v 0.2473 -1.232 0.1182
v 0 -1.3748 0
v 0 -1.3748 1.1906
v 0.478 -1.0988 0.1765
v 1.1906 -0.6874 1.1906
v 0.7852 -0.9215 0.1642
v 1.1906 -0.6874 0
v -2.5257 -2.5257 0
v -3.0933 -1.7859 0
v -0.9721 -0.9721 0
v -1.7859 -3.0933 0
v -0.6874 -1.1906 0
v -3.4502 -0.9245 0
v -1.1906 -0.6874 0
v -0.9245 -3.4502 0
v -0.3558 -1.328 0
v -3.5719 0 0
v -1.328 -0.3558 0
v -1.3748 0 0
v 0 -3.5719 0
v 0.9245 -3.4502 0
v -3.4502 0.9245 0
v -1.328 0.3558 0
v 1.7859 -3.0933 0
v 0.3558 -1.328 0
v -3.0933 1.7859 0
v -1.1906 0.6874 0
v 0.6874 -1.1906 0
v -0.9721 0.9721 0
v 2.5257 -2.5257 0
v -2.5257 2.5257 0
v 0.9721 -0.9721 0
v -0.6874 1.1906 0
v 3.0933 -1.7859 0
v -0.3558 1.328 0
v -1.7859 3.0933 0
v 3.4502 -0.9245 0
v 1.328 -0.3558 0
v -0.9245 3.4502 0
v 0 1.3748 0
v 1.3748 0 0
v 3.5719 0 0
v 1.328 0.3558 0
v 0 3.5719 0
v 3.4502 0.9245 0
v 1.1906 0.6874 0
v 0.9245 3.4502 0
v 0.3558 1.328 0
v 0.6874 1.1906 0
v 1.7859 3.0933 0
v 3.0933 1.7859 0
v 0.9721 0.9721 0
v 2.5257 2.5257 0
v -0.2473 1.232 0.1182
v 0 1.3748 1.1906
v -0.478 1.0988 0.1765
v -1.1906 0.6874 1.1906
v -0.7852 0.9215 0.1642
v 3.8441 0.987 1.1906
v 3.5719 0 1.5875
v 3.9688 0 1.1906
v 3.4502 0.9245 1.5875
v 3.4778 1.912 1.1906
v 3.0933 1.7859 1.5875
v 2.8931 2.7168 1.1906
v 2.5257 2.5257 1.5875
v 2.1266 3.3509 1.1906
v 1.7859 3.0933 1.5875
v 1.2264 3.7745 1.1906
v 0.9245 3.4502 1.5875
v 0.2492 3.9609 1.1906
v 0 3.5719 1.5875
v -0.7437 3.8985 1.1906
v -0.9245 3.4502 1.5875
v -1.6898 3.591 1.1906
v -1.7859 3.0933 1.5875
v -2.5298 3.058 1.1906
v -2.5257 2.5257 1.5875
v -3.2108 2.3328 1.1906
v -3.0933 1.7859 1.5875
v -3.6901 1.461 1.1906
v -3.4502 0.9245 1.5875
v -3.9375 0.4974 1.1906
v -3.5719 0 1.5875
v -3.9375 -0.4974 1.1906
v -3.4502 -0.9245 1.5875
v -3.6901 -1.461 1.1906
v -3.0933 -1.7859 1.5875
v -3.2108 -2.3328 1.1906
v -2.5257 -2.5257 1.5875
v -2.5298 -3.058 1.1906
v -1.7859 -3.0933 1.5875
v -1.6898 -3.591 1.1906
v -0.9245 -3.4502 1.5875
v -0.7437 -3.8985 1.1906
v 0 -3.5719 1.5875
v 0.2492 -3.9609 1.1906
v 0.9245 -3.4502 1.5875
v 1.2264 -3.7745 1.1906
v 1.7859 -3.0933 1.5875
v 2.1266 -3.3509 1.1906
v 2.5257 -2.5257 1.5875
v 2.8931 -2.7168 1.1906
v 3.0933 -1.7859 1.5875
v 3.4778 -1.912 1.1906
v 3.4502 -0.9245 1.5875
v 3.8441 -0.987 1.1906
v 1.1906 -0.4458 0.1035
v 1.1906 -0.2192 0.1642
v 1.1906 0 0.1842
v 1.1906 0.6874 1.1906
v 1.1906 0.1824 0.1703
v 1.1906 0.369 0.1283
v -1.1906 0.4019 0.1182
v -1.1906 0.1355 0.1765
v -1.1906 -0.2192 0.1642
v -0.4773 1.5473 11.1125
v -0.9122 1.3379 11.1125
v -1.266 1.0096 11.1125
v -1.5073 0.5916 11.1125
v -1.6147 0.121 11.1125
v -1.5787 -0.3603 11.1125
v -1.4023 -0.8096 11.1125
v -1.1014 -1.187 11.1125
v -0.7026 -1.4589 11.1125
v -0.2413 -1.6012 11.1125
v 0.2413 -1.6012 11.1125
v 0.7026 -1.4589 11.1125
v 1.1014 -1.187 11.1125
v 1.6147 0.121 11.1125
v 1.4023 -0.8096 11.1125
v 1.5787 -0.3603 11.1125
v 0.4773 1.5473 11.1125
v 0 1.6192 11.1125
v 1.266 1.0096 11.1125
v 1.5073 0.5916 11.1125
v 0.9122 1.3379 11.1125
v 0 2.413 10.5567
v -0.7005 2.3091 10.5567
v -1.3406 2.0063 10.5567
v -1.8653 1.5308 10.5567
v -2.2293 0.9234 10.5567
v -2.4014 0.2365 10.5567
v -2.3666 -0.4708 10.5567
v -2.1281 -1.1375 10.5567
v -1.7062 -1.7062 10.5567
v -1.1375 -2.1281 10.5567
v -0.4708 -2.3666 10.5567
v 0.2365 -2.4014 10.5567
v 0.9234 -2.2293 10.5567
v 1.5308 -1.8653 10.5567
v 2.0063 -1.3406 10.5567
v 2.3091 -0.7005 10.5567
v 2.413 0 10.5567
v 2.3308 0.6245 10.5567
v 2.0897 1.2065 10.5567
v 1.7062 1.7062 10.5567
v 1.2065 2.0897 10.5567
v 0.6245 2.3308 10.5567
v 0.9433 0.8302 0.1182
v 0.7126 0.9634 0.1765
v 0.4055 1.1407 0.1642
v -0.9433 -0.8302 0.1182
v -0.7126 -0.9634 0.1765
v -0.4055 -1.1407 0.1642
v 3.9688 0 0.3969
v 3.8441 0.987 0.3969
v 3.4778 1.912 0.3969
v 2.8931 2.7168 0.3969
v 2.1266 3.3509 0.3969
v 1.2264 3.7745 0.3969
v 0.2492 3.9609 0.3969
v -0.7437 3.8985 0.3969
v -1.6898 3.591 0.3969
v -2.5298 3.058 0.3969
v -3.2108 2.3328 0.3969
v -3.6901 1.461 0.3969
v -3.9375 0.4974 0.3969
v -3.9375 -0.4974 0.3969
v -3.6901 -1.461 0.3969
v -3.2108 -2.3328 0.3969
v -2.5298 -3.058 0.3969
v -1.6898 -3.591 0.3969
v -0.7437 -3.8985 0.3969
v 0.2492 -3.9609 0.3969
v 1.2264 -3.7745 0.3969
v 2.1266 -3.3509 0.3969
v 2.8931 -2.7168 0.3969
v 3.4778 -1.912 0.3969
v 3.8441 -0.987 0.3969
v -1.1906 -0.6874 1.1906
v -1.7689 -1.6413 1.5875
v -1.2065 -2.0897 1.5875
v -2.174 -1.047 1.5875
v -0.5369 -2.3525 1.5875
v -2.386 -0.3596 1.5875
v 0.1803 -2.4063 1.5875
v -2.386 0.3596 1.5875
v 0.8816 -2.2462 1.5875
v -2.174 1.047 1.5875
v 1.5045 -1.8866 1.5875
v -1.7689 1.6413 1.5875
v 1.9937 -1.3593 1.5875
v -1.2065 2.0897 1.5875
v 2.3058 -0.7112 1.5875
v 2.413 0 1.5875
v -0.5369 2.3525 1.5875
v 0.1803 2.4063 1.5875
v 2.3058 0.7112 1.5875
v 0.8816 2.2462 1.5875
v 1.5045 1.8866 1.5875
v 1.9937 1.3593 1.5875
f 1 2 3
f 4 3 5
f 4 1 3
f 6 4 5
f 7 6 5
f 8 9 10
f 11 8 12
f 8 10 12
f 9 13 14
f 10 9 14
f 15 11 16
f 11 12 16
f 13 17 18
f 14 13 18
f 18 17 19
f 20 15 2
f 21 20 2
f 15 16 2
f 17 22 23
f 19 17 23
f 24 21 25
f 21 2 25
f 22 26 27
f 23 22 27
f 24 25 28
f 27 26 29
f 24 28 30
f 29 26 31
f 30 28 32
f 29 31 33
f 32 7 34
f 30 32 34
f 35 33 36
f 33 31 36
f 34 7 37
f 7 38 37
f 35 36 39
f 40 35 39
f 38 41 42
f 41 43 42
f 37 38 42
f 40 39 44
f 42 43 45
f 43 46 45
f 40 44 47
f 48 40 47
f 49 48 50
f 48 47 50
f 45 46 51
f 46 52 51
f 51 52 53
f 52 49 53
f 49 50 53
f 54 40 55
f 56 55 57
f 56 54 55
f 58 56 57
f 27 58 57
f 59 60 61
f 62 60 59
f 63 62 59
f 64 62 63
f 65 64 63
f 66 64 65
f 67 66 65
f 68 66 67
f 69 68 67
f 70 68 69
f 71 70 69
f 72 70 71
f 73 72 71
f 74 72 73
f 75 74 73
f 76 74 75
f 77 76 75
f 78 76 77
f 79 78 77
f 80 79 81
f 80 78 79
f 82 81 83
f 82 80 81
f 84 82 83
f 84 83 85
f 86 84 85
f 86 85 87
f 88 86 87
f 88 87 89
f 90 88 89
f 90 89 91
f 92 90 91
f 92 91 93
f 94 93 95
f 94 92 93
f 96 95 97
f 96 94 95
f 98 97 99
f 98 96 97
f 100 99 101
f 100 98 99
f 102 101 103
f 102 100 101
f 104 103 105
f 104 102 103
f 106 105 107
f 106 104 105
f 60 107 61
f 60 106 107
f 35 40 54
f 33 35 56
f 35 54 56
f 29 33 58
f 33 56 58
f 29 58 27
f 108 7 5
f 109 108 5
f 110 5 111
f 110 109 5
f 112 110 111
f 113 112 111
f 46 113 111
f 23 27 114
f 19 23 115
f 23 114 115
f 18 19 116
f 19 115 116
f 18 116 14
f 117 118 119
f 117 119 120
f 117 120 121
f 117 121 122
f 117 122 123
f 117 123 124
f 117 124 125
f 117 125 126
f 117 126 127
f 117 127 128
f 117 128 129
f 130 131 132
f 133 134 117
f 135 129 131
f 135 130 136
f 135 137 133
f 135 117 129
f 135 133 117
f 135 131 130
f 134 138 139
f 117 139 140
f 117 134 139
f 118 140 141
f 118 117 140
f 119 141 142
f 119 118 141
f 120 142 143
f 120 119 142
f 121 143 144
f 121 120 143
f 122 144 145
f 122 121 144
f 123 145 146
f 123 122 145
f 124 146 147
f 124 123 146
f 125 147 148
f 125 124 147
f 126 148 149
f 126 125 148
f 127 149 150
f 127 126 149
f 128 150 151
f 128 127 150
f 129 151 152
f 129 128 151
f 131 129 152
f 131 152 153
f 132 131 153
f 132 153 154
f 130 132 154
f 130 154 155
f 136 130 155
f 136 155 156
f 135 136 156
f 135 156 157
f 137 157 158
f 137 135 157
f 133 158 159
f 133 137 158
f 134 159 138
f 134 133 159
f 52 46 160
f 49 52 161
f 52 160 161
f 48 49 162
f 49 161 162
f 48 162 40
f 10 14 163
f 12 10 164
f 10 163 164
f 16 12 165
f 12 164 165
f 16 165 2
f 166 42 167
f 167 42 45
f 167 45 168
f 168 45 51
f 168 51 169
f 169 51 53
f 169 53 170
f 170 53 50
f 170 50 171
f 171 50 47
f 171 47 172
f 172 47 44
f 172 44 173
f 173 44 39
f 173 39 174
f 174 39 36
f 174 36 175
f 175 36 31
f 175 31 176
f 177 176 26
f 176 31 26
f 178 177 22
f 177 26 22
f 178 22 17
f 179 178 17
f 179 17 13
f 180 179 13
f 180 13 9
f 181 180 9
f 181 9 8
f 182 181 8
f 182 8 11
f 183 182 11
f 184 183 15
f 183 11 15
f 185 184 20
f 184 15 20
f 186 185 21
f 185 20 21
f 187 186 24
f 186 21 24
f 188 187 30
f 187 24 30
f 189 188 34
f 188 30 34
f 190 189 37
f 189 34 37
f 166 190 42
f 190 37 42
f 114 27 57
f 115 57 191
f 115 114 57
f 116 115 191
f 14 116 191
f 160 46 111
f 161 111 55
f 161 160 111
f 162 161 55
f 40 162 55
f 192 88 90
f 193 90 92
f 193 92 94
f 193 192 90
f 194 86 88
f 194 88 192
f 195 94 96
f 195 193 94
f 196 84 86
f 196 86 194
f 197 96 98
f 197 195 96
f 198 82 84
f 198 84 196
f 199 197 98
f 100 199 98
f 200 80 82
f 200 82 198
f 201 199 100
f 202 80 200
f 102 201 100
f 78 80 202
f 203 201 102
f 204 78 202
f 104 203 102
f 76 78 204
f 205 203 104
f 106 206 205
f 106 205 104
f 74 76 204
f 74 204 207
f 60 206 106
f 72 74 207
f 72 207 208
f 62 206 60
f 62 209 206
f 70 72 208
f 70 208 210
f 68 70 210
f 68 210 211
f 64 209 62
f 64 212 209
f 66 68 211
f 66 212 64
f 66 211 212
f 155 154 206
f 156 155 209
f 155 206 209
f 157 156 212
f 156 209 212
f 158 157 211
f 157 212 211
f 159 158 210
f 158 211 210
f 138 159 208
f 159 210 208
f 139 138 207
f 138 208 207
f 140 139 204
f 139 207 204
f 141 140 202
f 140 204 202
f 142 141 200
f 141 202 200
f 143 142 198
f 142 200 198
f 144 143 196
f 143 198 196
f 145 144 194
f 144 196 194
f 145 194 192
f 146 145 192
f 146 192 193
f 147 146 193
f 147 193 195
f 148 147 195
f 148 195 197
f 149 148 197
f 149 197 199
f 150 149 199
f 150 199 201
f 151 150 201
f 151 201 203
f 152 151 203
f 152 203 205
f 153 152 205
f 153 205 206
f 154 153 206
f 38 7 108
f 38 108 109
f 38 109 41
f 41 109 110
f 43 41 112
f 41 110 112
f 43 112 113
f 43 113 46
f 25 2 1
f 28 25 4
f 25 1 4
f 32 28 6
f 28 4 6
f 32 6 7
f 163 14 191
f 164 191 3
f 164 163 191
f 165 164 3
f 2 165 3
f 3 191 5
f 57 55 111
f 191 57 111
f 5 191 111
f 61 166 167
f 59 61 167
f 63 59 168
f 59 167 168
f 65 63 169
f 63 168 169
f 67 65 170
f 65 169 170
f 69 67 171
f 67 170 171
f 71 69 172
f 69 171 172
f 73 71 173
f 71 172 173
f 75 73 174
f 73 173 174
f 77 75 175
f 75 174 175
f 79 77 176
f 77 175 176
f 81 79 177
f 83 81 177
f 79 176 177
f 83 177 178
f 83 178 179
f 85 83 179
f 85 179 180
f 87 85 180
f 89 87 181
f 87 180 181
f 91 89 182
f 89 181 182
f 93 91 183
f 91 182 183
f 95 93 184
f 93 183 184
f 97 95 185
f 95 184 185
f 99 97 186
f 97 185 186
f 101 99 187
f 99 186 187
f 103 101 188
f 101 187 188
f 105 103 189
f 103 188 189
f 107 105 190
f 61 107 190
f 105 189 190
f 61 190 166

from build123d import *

# Parameters (mm, degrees)
SKETCH1_R          = 2.413
EXTRUDE1_DEPTH     = 11.1125
SKETCH6_R          = 3.96875
EXTRUDE2_DEPTH     = 1.5875
CUT_EXTRUDE1_DEPTH = 1.190625
SKETCH8_R          = 1.374815329
CUT_EXTRUDE2_DEPTH = 1.190625
CUT_EXTRUDE2_TAPER = 45
CHAMFER1_SIZE      = 0.396875


with BuildPart() as part:
    # Sketch1 → Extrude1 (new body)
    with BuildSketch(Plane.XY):
        Circle(SKETCH1_R)
    extrude(amount=EXTRUDE1_DEPTH)

    # Sketch4 → Cut-Revolve1 (revolve, cut)
    with BuildSketch(Plane(origin=(0, 0, 0), x_dir=(0, 0, -1), z_dir=(1, 0, 0))):
        Polygon((-10.556710267, 2.413), (-11.1125, 1.61925), (-11.1125, 2.413), align=None)
    revolve(axis=Axis((0, 0, 0), (0, 0, 1)), mode=Mode.SUBTRACT)

    # Sketch6 → Extrude2 (add)
    with BuildSketch(Plane.XY):
        Circle(SKETCH6_R)
    extrude(amount=EXTRUDE2_DEPTH)

    # Sketch7 → Cut-Extrude1 (cut)
    with BuildSketch(Plane.XY):
        Polygon((0, 1.374815329), (-1.190625, 0.687407664), (-1.190625, -0.687407664), (0, -1.374815329), (1.190625, -0.687407664), (1.190625, 0.687407664), align=None)
    extrude(amount=CUT_EXTRUDE1_DEPTH, mode=Mode.SUBTRACT)

    # Sketch8 → Cut-Extrude2 (cut)
    with BuildSketch(Plane.XY):
        Circle(SKETCH8_R)
    extrude(amount=CUT_EXTRUDE2_DEPTH, taper=CUT_EXTRUDE2_TAPER, mode=Mode.SUBTRACT)

    # Chamfer1
    chamfer1_edges = [part.edges().sort_by_distance(p)[0] for p in [
        (-3.96875, 0, 1.5875),
        (-3.96875, 0, 0),
    ]]
    chamfer(chamfer1_edges, length=CHAMFER1_SIZE)


solid = part.part
